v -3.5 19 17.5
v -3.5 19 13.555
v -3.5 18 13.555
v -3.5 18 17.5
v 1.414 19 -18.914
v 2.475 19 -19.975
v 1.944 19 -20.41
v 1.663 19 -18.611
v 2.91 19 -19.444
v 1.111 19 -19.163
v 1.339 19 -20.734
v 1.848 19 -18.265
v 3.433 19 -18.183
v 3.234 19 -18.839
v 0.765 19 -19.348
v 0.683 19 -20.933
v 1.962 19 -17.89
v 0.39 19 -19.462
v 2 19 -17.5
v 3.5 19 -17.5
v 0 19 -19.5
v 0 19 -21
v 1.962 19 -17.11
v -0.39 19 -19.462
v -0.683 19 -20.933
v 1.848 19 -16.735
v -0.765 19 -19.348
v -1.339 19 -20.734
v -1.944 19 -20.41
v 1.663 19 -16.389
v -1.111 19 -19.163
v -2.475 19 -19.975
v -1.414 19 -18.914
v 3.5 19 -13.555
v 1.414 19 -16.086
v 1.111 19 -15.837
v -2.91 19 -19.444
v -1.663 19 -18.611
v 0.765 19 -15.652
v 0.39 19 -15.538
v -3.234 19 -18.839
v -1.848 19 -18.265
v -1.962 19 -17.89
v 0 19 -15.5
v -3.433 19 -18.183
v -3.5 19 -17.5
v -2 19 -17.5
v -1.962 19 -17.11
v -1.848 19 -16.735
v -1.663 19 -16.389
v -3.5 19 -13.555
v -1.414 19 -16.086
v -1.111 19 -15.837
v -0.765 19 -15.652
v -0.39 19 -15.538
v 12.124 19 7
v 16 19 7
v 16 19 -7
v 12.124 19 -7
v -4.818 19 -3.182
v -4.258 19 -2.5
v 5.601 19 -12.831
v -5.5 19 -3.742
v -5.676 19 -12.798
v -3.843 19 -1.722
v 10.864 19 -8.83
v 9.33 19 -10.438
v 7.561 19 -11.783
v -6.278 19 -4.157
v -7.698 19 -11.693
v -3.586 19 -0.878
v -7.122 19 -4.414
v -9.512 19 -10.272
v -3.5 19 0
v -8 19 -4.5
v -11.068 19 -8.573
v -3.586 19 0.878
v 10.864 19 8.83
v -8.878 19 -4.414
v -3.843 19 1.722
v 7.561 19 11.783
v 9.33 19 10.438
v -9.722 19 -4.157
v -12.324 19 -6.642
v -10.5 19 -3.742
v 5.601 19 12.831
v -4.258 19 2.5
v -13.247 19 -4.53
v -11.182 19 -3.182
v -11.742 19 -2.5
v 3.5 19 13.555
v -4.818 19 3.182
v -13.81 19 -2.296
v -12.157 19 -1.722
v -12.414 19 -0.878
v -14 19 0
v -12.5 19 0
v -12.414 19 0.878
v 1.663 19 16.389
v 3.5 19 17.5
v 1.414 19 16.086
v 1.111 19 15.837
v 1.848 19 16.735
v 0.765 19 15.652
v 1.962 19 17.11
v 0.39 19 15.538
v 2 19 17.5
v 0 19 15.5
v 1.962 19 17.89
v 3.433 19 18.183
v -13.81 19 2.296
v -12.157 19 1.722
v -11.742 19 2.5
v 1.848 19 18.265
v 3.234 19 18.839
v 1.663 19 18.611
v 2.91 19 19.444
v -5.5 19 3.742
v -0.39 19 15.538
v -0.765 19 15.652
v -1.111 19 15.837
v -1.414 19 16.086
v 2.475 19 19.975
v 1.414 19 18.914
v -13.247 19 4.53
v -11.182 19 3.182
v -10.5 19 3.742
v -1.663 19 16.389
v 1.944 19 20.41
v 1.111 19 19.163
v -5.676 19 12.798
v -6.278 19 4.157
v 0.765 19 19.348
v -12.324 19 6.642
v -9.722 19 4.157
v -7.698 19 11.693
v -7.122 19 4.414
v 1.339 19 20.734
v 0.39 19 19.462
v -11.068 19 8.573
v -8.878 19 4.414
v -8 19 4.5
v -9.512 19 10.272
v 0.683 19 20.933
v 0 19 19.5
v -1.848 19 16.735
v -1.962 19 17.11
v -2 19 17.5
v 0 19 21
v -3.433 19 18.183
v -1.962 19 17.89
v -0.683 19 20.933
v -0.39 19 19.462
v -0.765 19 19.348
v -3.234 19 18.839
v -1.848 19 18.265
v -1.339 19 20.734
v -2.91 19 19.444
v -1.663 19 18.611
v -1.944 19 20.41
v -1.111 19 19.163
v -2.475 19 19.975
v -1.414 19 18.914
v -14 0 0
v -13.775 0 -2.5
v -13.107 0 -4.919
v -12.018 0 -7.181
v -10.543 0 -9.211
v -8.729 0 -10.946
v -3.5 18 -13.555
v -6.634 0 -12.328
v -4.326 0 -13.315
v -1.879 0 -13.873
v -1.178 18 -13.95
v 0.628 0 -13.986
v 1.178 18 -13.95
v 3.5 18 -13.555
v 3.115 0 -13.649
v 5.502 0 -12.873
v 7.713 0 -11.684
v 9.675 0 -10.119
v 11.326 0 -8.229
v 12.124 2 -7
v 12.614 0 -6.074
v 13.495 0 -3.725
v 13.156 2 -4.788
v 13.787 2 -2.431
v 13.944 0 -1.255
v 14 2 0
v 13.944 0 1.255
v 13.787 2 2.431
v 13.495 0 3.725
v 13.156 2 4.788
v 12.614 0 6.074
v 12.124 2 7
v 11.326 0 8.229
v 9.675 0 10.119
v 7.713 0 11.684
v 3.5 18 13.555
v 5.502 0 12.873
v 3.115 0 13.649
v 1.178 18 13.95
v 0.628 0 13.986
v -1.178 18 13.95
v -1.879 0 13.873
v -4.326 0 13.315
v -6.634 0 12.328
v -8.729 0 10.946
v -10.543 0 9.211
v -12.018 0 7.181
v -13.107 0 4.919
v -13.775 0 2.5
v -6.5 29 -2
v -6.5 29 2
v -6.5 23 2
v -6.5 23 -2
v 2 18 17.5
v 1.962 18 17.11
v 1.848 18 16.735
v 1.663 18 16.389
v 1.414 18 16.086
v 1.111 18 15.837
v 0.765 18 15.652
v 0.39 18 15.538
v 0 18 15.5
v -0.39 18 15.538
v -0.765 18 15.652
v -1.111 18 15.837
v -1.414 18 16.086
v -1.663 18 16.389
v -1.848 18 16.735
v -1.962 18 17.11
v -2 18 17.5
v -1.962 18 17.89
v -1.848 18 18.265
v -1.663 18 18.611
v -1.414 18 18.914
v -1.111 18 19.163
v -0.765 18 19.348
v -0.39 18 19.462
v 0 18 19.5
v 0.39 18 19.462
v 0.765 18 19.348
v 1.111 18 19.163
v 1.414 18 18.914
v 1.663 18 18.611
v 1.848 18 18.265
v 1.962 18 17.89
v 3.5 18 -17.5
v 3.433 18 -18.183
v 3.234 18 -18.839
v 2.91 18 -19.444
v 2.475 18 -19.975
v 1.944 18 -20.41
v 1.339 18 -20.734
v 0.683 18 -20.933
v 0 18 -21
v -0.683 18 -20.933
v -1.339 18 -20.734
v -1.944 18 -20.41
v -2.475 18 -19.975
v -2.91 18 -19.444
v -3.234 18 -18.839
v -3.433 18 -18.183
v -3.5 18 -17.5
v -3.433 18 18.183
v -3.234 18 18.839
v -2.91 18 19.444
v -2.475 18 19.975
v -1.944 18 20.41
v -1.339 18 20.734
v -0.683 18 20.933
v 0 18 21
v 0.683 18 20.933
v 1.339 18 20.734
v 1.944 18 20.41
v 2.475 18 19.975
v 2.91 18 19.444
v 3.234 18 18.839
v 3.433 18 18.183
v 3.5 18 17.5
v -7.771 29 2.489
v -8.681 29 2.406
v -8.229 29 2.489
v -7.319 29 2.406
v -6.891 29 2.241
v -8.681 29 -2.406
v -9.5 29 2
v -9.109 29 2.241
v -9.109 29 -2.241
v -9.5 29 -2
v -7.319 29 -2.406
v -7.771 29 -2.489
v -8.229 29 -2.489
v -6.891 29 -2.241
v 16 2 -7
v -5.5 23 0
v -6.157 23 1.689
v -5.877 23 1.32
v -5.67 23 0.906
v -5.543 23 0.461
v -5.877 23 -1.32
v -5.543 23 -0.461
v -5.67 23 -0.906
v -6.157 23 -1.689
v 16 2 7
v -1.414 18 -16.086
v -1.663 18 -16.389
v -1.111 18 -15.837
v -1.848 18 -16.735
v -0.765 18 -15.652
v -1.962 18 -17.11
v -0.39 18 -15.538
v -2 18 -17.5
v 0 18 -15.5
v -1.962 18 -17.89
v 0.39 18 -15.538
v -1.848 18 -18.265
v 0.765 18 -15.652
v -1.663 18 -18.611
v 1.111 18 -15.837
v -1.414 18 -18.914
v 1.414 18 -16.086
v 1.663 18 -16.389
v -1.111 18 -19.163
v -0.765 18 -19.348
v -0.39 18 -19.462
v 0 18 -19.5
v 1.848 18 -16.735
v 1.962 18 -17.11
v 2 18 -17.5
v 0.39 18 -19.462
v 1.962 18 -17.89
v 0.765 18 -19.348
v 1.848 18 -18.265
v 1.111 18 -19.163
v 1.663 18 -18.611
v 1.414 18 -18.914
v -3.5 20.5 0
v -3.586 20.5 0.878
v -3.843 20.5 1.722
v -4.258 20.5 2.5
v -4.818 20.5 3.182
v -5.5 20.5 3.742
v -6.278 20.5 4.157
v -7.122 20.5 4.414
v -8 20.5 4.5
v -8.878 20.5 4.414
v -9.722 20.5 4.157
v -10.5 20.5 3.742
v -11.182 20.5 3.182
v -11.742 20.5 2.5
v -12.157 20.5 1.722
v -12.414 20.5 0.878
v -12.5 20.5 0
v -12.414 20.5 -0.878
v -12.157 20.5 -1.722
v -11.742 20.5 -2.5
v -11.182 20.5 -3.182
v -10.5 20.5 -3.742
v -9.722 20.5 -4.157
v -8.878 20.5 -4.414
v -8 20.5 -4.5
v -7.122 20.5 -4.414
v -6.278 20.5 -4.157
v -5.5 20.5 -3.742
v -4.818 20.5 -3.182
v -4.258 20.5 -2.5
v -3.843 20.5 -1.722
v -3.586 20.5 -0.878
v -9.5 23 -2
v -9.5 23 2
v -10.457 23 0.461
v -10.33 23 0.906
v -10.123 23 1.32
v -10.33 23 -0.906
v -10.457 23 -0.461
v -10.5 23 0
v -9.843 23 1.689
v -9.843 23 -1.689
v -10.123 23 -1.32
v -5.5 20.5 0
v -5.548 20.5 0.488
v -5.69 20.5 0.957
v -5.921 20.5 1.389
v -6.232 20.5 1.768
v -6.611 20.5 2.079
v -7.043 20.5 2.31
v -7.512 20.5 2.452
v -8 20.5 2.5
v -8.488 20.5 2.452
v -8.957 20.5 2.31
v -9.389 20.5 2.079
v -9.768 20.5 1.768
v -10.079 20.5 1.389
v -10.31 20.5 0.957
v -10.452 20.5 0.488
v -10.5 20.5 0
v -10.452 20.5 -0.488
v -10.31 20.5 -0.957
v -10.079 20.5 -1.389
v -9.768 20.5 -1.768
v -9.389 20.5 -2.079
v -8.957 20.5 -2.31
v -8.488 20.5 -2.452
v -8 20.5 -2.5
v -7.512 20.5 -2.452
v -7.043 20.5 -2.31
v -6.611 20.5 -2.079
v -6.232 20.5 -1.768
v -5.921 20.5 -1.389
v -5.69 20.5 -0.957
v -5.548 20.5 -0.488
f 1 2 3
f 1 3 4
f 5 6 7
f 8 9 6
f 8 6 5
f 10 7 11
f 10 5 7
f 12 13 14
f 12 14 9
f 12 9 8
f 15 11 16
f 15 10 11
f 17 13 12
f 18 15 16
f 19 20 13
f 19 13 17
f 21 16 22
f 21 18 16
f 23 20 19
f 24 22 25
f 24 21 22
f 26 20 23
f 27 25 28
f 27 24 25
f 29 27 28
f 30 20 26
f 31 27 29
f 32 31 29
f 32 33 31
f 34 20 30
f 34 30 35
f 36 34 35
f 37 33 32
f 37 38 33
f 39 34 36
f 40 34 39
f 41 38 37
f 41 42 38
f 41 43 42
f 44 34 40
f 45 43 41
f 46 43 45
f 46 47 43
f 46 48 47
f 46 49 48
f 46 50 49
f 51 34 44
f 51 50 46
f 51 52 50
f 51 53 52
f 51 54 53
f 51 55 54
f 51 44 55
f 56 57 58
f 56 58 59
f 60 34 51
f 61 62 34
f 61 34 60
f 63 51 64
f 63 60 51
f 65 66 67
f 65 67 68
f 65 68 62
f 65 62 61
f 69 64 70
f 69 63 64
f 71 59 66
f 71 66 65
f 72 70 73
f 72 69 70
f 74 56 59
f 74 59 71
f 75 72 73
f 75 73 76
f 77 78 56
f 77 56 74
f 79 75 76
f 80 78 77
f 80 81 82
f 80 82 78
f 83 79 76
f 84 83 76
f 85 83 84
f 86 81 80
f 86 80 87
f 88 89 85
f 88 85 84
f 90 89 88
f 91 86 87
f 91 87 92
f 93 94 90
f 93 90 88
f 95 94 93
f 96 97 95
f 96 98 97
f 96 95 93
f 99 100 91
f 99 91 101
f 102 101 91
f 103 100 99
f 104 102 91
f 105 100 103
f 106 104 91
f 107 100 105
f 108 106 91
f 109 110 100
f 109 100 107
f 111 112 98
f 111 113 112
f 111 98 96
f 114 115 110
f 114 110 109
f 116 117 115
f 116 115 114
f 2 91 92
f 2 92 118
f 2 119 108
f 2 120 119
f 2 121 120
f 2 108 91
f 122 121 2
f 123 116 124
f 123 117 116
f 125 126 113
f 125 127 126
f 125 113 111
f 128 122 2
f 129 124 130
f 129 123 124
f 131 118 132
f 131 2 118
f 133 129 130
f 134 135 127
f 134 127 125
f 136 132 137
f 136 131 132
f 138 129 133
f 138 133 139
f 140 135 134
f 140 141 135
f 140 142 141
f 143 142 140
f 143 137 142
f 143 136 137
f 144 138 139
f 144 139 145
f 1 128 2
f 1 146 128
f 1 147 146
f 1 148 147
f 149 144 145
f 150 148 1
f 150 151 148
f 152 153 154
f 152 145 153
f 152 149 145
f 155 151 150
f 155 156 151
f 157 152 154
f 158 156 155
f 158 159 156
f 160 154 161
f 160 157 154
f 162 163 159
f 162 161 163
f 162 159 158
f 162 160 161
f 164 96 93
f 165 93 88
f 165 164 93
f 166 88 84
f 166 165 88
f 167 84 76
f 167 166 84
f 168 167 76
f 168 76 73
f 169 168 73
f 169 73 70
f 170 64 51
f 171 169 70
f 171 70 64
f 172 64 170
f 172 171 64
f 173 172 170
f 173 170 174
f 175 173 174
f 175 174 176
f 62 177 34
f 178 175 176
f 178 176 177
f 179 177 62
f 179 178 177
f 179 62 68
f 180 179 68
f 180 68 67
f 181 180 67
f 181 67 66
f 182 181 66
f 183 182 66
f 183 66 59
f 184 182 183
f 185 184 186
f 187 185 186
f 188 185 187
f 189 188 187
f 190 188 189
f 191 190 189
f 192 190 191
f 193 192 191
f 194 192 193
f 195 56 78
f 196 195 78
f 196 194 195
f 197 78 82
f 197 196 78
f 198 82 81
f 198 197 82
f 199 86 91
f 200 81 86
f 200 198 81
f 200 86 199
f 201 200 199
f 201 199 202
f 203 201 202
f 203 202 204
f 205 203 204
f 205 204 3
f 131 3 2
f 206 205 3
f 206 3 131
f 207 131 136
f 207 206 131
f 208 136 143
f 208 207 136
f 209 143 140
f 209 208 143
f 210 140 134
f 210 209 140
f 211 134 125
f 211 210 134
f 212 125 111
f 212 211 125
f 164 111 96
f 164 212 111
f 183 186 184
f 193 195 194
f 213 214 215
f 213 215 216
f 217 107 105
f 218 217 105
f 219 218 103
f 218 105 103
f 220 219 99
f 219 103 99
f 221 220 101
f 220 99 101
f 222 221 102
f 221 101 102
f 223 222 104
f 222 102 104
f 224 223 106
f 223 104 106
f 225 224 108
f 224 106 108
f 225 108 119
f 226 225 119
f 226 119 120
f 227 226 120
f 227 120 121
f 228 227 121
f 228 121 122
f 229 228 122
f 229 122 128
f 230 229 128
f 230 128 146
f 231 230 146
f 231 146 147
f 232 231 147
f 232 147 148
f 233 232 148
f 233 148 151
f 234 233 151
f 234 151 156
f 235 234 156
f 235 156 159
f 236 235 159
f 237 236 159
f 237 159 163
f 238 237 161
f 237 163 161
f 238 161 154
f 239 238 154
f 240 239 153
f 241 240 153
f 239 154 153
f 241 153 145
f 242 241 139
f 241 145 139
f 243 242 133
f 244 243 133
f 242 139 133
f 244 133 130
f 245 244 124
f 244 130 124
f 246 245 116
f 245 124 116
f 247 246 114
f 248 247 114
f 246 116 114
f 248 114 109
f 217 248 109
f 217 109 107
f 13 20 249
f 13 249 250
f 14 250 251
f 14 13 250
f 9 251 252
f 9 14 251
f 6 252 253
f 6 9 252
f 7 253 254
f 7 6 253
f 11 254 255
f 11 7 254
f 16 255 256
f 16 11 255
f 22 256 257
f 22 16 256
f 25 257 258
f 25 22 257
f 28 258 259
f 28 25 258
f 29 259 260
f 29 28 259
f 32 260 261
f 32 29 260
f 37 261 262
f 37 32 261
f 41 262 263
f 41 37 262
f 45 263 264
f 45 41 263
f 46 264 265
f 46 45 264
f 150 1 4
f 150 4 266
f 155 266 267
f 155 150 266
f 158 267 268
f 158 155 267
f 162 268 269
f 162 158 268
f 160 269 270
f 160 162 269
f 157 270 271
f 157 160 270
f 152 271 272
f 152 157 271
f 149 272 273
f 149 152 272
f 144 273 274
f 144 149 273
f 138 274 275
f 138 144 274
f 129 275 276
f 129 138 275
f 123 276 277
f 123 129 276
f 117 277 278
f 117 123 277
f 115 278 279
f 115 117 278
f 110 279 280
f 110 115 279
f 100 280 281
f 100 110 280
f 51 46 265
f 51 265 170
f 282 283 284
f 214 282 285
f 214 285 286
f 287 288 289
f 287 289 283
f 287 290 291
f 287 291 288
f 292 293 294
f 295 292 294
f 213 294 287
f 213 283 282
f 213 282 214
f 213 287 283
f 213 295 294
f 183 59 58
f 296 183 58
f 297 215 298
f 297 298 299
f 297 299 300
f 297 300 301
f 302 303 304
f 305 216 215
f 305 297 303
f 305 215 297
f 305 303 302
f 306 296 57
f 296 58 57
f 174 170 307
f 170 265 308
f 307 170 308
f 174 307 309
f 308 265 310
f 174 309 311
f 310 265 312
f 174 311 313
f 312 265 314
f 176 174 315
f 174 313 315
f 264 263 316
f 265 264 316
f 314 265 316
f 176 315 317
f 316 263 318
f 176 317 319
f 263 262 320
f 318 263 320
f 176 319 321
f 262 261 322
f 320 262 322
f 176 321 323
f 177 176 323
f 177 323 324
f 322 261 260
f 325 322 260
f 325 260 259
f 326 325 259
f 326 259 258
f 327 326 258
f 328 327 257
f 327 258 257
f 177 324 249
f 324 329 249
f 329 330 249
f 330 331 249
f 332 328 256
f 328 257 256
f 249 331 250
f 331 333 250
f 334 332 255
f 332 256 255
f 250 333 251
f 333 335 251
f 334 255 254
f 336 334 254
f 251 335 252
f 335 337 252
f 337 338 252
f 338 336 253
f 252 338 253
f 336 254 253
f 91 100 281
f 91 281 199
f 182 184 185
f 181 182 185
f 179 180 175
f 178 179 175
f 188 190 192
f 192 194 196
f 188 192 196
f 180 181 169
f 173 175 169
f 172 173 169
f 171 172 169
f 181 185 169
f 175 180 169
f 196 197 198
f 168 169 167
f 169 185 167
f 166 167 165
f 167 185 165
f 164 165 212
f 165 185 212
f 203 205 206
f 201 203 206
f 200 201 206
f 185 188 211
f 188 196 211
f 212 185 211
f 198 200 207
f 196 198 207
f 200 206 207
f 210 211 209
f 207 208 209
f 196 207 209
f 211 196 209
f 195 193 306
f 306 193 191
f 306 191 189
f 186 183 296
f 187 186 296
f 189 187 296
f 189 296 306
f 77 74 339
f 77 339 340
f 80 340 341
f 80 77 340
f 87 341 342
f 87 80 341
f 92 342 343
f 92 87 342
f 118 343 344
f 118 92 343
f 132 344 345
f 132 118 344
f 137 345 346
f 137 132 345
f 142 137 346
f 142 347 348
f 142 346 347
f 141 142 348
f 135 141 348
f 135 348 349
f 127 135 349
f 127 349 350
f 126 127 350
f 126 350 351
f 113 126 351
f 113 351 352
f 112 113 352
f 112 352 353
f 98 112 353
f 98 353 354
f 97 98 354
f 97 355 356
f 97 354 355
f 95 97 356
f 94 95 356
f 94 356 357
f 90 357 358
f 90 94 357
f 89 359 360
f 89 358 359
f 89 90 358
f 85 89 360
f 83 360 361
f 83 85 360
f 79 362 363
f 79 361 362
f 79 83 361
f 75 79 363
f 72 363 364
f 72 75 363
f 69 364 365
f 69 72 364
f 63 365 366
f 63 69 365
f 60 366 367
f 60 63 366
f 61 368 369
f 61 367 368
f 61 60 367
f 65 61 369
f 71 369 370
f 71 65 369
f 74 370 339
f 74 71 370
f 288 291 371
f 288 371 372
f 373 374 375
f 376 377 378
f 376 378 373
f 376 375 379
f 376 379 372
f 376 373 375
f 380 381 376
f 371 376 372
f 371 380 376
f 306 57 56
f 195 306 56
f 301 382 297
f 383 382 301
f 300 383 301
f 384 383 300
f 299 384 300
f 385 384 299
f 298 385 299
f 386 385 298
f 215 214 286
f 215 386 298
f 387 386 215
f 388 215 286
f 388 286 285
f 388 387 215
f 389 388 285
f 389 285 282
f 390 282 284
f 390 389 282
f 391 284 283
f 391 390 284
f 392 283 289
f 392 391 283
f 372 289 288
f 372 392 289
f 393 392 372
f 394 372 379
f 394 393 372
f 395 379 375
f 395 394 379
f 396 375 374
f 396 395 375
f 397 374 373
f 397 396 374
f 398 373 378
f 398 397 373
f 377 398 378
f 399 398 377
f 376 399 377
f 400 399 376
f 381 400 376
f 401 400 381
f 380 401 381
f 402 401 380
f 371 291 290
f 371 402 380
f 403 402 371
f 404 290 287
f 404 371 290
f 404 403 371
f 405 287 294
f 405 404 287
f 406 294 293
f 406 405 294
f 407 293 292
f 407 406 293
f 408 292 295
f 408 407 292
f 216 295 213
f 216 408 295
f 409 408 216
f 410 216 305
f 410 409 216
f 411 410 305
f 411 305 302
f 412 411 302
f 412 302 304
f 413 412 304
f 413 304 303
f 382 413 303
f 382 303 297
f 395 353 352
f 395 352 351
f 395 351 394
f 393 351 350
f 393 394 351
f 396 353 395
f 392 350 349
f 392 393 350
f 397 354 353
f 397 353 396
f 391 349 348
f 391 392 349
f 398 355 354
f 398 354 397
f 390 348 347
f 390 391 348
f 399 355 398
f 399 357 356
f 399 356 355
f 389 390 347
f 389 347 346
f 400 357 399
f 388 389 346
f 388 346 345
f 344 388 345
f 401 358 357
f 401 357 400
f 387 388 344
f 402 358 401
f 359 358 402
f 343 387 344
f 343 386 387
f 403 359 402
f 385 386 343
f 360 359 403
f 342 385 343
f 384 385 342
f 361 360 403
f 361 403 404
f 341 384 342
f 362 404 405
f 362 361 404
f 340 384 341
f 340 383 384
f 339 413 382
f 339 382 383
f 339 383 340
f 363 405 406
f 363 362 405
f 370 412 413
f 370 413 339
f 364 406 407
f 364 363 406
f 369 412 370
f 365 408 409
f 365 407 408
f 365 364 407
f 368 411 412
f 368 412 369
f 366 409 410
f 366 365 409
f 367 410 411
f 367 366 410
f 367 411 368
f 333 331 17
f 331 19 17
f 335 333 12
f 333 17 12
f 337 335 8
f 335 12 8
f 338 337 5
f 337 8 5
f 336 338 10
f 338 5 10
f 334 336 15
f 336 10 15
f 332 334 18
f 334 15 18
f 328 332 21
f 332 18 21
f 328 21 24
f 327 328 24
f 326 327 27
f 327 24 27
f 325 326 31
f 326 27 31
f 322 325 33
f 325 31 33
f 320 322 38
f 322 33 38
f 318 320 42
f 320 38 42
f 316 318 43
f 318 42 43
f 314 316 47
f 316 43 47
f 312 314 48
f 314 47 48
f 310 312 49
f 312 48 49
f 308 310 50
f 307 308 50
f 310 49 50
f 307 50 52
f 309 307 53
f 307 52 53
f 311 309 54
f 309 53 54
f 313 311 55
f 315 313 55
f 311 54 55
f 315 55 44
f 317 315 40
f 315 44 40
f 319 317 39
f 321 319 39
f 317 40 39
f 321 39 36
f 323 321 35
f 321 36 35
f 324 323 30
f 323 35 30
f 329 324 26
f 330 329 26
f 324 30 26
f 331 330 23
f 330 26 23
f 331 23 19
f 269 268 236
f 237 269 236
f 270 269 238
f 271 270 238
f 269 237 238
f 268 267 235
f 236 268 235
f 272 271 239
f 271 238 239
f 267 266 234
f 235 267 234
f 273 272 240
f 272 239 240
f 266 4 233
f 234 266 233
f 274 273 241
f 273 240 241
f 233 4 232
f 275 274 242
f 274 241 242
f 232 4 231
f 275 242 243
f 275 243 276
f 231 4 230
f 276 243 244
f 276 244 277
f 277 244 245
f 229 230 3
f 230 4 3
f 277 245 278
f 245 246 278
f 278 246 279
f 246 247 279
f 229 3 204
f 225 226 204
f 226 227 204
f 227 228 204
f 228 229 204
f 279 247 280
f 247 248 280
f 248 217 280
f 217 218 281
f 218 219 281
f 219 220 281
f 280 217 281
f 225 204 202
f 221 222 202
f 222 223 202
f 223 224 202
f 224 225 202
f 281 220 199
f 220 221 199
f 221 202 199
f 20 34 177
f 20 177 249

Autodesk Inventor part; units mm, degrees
ref_plane "YZ Plane" through (0, 0, 0) normal (1, 0, 0) x (0, 1, 0)
ref_plane "XZ Plane" through (0, 0, 0) normal (0, 1, 0) x (-1, 0, 0)
ref_plane "XY Plane" through (0, 0, 0) normal (0, 0, 1) x (1, 0, 0)
sketch "Sketch1" plane through (0, 0, 0) normal (0, 1, 0) x (-1, 0, 0)
  circle A0 centre (0, 0) radius 14
  dimension "d0" = 28
extrude "Extrusion1" add sketch "Sketch1" along normal blind 19
sketch "Sketch3" plane through (0, 19, 0) normal (0, 1, 0) x (1, 0, 0)
  circle A0 centre (0, 0) radius 14 projected
  line L0 (3.5, 13.5554) -> (3.5, 17.5) projected
  arc A1 (3.5, 17.5) -> (-3.5, 17.5) centre (0, 17.5) ccw projected
  line L1 (-3.5, 17.5) -> (-3.5, 13.5554) projected
  arc A2 (3.5, 13.5554) -> (-3.5, 13.5554) centre (0, 0) ccw projected
  circle A3 centre (0, 17.5) radius 2 projected
  line L2 (-3.5, -13.5554) -> (-3.5, -17.5) projected
  arc A4 (-3.5, -17.5) -> (3.5, -17.5) centre (0, -17.5) ccw projected
  line L3 (3.5, -17.5) -> (3.5, -13.5554) projected
  arc A5 (-3.5, -13.5554) -> (3.5, -13.5554) centre (0, 0) ccw projected
  circle A6 centre (0, -17.5) radius 2 projected
  circle A7 centre (-8, 0) radius 4.5
  dimension "d8" = 9
  dimension "d9" = 8
extrude "Extrusion3" add sketch "Sketch3" along normal blind 1.5 contours A7
sketch "Sketch4" plane through (-8, 20.5, 0) normal (0, 1, 0) x (1, 0, 0)
  circle A0 centre (0, 0) radius 4.5 projected
  circle A1 centre (0, 0) radius 2.5
  point P0 (8, 0)
  dimension "d12" = 5
extrude "Extrusion4" add sketch "Sketch4" along normal blind 8.5 contours A1
sketch "Sketch5" plane through (-8, 29, 0) normal (0, 1, 0) x (1, 0, 0)
  circle A0 centre (0, 0) radius 2.5 projected
  circle A1 centre (0, 0) radius 2.5 projected
  line L0 (-1.5, 2) -> (-1.5, -2)
  line L1 (1.5, -2) -> (1.5, 2)
  point P0 (8, 0)
  point P1 (1.5, 2)
  point P2 (1.5, -2)
  dimension "d15" = 1.5
  dimension "d16" = 3
extrude "Extrusion5" cut sketch "Sketch5" against normal blind 6 contours A0 L1 | L0 A0
sketch "Sketch7" plane through (0, 19, 0) normal (0, 1, 0) x (1, 0, 0)
  circle A0 centre (-8, 0) radius 4.5 projected
  circle A1 centre (0, 0) radius 14 projected
  line L0 (0, -17.5) -> (0, 17.5) construction
  line L1 (3.5, -17.5) -> (3.5, 17.5)
  line L2 (-3.5, 17.5) -> (-3.5, -17.5)
  arc A2 (-3.5, -17.5) -> (3.5, -17.5) centre (0, -17.5) ccw
  arc A3 (3.5, 17.5) -> (-3.5, 17.5) centre (0, 17.5) ccw
  circle A4 centre (0, 17.5) radius 2
  circle A5 centre (0, -17.5) radius 2
  point P0 (3.5, -13.5554)
  point P1 (-3.5, -13.5554)
  point P2 (-3.5, 13.5554)
  point P3 (3.5, 13.5554)
  dimension "d24" = 35
  dimension "d25" = 3.5
  dimension "d26" = 4
extrude "Extrusion7" add sketch "Sketch7" against normal blind 1 contours L2 A3 L1 A1 | A1 L1 A2 L2
sketch "Sketch8" plane through (0, 19, 0) normal (0, 1, 0) x (1, 0, 0)
  arc A0 (3.5, -13.5554) -> (3.5, 13.5554) centre (0, 0) ccw projected
  line L0 (12.1244, 7) -> (16, 7)
  line L1 (16, 7) -> (16, -7)
  line L2 (16, -7) -> (12.1244, -7)
  circle A1 centre (0, 0) radius 14 projected
  point P0 (14.0622, 7)
  point P1 (16, 0)
  point P2 (14, 0)
  dimension "d29" = 7
  dimension "d30" = 7
  dimension "d31" = 2
extrude "Extrusion8" add sketch "Sketch8" against normal blind 17 contours A0 L0 L1 L2
equation "\"d16\" = 2 * d15"
equation "\"d30\" = d29"
properties part number "28BYJ-48" material "Aluminum 6061"
